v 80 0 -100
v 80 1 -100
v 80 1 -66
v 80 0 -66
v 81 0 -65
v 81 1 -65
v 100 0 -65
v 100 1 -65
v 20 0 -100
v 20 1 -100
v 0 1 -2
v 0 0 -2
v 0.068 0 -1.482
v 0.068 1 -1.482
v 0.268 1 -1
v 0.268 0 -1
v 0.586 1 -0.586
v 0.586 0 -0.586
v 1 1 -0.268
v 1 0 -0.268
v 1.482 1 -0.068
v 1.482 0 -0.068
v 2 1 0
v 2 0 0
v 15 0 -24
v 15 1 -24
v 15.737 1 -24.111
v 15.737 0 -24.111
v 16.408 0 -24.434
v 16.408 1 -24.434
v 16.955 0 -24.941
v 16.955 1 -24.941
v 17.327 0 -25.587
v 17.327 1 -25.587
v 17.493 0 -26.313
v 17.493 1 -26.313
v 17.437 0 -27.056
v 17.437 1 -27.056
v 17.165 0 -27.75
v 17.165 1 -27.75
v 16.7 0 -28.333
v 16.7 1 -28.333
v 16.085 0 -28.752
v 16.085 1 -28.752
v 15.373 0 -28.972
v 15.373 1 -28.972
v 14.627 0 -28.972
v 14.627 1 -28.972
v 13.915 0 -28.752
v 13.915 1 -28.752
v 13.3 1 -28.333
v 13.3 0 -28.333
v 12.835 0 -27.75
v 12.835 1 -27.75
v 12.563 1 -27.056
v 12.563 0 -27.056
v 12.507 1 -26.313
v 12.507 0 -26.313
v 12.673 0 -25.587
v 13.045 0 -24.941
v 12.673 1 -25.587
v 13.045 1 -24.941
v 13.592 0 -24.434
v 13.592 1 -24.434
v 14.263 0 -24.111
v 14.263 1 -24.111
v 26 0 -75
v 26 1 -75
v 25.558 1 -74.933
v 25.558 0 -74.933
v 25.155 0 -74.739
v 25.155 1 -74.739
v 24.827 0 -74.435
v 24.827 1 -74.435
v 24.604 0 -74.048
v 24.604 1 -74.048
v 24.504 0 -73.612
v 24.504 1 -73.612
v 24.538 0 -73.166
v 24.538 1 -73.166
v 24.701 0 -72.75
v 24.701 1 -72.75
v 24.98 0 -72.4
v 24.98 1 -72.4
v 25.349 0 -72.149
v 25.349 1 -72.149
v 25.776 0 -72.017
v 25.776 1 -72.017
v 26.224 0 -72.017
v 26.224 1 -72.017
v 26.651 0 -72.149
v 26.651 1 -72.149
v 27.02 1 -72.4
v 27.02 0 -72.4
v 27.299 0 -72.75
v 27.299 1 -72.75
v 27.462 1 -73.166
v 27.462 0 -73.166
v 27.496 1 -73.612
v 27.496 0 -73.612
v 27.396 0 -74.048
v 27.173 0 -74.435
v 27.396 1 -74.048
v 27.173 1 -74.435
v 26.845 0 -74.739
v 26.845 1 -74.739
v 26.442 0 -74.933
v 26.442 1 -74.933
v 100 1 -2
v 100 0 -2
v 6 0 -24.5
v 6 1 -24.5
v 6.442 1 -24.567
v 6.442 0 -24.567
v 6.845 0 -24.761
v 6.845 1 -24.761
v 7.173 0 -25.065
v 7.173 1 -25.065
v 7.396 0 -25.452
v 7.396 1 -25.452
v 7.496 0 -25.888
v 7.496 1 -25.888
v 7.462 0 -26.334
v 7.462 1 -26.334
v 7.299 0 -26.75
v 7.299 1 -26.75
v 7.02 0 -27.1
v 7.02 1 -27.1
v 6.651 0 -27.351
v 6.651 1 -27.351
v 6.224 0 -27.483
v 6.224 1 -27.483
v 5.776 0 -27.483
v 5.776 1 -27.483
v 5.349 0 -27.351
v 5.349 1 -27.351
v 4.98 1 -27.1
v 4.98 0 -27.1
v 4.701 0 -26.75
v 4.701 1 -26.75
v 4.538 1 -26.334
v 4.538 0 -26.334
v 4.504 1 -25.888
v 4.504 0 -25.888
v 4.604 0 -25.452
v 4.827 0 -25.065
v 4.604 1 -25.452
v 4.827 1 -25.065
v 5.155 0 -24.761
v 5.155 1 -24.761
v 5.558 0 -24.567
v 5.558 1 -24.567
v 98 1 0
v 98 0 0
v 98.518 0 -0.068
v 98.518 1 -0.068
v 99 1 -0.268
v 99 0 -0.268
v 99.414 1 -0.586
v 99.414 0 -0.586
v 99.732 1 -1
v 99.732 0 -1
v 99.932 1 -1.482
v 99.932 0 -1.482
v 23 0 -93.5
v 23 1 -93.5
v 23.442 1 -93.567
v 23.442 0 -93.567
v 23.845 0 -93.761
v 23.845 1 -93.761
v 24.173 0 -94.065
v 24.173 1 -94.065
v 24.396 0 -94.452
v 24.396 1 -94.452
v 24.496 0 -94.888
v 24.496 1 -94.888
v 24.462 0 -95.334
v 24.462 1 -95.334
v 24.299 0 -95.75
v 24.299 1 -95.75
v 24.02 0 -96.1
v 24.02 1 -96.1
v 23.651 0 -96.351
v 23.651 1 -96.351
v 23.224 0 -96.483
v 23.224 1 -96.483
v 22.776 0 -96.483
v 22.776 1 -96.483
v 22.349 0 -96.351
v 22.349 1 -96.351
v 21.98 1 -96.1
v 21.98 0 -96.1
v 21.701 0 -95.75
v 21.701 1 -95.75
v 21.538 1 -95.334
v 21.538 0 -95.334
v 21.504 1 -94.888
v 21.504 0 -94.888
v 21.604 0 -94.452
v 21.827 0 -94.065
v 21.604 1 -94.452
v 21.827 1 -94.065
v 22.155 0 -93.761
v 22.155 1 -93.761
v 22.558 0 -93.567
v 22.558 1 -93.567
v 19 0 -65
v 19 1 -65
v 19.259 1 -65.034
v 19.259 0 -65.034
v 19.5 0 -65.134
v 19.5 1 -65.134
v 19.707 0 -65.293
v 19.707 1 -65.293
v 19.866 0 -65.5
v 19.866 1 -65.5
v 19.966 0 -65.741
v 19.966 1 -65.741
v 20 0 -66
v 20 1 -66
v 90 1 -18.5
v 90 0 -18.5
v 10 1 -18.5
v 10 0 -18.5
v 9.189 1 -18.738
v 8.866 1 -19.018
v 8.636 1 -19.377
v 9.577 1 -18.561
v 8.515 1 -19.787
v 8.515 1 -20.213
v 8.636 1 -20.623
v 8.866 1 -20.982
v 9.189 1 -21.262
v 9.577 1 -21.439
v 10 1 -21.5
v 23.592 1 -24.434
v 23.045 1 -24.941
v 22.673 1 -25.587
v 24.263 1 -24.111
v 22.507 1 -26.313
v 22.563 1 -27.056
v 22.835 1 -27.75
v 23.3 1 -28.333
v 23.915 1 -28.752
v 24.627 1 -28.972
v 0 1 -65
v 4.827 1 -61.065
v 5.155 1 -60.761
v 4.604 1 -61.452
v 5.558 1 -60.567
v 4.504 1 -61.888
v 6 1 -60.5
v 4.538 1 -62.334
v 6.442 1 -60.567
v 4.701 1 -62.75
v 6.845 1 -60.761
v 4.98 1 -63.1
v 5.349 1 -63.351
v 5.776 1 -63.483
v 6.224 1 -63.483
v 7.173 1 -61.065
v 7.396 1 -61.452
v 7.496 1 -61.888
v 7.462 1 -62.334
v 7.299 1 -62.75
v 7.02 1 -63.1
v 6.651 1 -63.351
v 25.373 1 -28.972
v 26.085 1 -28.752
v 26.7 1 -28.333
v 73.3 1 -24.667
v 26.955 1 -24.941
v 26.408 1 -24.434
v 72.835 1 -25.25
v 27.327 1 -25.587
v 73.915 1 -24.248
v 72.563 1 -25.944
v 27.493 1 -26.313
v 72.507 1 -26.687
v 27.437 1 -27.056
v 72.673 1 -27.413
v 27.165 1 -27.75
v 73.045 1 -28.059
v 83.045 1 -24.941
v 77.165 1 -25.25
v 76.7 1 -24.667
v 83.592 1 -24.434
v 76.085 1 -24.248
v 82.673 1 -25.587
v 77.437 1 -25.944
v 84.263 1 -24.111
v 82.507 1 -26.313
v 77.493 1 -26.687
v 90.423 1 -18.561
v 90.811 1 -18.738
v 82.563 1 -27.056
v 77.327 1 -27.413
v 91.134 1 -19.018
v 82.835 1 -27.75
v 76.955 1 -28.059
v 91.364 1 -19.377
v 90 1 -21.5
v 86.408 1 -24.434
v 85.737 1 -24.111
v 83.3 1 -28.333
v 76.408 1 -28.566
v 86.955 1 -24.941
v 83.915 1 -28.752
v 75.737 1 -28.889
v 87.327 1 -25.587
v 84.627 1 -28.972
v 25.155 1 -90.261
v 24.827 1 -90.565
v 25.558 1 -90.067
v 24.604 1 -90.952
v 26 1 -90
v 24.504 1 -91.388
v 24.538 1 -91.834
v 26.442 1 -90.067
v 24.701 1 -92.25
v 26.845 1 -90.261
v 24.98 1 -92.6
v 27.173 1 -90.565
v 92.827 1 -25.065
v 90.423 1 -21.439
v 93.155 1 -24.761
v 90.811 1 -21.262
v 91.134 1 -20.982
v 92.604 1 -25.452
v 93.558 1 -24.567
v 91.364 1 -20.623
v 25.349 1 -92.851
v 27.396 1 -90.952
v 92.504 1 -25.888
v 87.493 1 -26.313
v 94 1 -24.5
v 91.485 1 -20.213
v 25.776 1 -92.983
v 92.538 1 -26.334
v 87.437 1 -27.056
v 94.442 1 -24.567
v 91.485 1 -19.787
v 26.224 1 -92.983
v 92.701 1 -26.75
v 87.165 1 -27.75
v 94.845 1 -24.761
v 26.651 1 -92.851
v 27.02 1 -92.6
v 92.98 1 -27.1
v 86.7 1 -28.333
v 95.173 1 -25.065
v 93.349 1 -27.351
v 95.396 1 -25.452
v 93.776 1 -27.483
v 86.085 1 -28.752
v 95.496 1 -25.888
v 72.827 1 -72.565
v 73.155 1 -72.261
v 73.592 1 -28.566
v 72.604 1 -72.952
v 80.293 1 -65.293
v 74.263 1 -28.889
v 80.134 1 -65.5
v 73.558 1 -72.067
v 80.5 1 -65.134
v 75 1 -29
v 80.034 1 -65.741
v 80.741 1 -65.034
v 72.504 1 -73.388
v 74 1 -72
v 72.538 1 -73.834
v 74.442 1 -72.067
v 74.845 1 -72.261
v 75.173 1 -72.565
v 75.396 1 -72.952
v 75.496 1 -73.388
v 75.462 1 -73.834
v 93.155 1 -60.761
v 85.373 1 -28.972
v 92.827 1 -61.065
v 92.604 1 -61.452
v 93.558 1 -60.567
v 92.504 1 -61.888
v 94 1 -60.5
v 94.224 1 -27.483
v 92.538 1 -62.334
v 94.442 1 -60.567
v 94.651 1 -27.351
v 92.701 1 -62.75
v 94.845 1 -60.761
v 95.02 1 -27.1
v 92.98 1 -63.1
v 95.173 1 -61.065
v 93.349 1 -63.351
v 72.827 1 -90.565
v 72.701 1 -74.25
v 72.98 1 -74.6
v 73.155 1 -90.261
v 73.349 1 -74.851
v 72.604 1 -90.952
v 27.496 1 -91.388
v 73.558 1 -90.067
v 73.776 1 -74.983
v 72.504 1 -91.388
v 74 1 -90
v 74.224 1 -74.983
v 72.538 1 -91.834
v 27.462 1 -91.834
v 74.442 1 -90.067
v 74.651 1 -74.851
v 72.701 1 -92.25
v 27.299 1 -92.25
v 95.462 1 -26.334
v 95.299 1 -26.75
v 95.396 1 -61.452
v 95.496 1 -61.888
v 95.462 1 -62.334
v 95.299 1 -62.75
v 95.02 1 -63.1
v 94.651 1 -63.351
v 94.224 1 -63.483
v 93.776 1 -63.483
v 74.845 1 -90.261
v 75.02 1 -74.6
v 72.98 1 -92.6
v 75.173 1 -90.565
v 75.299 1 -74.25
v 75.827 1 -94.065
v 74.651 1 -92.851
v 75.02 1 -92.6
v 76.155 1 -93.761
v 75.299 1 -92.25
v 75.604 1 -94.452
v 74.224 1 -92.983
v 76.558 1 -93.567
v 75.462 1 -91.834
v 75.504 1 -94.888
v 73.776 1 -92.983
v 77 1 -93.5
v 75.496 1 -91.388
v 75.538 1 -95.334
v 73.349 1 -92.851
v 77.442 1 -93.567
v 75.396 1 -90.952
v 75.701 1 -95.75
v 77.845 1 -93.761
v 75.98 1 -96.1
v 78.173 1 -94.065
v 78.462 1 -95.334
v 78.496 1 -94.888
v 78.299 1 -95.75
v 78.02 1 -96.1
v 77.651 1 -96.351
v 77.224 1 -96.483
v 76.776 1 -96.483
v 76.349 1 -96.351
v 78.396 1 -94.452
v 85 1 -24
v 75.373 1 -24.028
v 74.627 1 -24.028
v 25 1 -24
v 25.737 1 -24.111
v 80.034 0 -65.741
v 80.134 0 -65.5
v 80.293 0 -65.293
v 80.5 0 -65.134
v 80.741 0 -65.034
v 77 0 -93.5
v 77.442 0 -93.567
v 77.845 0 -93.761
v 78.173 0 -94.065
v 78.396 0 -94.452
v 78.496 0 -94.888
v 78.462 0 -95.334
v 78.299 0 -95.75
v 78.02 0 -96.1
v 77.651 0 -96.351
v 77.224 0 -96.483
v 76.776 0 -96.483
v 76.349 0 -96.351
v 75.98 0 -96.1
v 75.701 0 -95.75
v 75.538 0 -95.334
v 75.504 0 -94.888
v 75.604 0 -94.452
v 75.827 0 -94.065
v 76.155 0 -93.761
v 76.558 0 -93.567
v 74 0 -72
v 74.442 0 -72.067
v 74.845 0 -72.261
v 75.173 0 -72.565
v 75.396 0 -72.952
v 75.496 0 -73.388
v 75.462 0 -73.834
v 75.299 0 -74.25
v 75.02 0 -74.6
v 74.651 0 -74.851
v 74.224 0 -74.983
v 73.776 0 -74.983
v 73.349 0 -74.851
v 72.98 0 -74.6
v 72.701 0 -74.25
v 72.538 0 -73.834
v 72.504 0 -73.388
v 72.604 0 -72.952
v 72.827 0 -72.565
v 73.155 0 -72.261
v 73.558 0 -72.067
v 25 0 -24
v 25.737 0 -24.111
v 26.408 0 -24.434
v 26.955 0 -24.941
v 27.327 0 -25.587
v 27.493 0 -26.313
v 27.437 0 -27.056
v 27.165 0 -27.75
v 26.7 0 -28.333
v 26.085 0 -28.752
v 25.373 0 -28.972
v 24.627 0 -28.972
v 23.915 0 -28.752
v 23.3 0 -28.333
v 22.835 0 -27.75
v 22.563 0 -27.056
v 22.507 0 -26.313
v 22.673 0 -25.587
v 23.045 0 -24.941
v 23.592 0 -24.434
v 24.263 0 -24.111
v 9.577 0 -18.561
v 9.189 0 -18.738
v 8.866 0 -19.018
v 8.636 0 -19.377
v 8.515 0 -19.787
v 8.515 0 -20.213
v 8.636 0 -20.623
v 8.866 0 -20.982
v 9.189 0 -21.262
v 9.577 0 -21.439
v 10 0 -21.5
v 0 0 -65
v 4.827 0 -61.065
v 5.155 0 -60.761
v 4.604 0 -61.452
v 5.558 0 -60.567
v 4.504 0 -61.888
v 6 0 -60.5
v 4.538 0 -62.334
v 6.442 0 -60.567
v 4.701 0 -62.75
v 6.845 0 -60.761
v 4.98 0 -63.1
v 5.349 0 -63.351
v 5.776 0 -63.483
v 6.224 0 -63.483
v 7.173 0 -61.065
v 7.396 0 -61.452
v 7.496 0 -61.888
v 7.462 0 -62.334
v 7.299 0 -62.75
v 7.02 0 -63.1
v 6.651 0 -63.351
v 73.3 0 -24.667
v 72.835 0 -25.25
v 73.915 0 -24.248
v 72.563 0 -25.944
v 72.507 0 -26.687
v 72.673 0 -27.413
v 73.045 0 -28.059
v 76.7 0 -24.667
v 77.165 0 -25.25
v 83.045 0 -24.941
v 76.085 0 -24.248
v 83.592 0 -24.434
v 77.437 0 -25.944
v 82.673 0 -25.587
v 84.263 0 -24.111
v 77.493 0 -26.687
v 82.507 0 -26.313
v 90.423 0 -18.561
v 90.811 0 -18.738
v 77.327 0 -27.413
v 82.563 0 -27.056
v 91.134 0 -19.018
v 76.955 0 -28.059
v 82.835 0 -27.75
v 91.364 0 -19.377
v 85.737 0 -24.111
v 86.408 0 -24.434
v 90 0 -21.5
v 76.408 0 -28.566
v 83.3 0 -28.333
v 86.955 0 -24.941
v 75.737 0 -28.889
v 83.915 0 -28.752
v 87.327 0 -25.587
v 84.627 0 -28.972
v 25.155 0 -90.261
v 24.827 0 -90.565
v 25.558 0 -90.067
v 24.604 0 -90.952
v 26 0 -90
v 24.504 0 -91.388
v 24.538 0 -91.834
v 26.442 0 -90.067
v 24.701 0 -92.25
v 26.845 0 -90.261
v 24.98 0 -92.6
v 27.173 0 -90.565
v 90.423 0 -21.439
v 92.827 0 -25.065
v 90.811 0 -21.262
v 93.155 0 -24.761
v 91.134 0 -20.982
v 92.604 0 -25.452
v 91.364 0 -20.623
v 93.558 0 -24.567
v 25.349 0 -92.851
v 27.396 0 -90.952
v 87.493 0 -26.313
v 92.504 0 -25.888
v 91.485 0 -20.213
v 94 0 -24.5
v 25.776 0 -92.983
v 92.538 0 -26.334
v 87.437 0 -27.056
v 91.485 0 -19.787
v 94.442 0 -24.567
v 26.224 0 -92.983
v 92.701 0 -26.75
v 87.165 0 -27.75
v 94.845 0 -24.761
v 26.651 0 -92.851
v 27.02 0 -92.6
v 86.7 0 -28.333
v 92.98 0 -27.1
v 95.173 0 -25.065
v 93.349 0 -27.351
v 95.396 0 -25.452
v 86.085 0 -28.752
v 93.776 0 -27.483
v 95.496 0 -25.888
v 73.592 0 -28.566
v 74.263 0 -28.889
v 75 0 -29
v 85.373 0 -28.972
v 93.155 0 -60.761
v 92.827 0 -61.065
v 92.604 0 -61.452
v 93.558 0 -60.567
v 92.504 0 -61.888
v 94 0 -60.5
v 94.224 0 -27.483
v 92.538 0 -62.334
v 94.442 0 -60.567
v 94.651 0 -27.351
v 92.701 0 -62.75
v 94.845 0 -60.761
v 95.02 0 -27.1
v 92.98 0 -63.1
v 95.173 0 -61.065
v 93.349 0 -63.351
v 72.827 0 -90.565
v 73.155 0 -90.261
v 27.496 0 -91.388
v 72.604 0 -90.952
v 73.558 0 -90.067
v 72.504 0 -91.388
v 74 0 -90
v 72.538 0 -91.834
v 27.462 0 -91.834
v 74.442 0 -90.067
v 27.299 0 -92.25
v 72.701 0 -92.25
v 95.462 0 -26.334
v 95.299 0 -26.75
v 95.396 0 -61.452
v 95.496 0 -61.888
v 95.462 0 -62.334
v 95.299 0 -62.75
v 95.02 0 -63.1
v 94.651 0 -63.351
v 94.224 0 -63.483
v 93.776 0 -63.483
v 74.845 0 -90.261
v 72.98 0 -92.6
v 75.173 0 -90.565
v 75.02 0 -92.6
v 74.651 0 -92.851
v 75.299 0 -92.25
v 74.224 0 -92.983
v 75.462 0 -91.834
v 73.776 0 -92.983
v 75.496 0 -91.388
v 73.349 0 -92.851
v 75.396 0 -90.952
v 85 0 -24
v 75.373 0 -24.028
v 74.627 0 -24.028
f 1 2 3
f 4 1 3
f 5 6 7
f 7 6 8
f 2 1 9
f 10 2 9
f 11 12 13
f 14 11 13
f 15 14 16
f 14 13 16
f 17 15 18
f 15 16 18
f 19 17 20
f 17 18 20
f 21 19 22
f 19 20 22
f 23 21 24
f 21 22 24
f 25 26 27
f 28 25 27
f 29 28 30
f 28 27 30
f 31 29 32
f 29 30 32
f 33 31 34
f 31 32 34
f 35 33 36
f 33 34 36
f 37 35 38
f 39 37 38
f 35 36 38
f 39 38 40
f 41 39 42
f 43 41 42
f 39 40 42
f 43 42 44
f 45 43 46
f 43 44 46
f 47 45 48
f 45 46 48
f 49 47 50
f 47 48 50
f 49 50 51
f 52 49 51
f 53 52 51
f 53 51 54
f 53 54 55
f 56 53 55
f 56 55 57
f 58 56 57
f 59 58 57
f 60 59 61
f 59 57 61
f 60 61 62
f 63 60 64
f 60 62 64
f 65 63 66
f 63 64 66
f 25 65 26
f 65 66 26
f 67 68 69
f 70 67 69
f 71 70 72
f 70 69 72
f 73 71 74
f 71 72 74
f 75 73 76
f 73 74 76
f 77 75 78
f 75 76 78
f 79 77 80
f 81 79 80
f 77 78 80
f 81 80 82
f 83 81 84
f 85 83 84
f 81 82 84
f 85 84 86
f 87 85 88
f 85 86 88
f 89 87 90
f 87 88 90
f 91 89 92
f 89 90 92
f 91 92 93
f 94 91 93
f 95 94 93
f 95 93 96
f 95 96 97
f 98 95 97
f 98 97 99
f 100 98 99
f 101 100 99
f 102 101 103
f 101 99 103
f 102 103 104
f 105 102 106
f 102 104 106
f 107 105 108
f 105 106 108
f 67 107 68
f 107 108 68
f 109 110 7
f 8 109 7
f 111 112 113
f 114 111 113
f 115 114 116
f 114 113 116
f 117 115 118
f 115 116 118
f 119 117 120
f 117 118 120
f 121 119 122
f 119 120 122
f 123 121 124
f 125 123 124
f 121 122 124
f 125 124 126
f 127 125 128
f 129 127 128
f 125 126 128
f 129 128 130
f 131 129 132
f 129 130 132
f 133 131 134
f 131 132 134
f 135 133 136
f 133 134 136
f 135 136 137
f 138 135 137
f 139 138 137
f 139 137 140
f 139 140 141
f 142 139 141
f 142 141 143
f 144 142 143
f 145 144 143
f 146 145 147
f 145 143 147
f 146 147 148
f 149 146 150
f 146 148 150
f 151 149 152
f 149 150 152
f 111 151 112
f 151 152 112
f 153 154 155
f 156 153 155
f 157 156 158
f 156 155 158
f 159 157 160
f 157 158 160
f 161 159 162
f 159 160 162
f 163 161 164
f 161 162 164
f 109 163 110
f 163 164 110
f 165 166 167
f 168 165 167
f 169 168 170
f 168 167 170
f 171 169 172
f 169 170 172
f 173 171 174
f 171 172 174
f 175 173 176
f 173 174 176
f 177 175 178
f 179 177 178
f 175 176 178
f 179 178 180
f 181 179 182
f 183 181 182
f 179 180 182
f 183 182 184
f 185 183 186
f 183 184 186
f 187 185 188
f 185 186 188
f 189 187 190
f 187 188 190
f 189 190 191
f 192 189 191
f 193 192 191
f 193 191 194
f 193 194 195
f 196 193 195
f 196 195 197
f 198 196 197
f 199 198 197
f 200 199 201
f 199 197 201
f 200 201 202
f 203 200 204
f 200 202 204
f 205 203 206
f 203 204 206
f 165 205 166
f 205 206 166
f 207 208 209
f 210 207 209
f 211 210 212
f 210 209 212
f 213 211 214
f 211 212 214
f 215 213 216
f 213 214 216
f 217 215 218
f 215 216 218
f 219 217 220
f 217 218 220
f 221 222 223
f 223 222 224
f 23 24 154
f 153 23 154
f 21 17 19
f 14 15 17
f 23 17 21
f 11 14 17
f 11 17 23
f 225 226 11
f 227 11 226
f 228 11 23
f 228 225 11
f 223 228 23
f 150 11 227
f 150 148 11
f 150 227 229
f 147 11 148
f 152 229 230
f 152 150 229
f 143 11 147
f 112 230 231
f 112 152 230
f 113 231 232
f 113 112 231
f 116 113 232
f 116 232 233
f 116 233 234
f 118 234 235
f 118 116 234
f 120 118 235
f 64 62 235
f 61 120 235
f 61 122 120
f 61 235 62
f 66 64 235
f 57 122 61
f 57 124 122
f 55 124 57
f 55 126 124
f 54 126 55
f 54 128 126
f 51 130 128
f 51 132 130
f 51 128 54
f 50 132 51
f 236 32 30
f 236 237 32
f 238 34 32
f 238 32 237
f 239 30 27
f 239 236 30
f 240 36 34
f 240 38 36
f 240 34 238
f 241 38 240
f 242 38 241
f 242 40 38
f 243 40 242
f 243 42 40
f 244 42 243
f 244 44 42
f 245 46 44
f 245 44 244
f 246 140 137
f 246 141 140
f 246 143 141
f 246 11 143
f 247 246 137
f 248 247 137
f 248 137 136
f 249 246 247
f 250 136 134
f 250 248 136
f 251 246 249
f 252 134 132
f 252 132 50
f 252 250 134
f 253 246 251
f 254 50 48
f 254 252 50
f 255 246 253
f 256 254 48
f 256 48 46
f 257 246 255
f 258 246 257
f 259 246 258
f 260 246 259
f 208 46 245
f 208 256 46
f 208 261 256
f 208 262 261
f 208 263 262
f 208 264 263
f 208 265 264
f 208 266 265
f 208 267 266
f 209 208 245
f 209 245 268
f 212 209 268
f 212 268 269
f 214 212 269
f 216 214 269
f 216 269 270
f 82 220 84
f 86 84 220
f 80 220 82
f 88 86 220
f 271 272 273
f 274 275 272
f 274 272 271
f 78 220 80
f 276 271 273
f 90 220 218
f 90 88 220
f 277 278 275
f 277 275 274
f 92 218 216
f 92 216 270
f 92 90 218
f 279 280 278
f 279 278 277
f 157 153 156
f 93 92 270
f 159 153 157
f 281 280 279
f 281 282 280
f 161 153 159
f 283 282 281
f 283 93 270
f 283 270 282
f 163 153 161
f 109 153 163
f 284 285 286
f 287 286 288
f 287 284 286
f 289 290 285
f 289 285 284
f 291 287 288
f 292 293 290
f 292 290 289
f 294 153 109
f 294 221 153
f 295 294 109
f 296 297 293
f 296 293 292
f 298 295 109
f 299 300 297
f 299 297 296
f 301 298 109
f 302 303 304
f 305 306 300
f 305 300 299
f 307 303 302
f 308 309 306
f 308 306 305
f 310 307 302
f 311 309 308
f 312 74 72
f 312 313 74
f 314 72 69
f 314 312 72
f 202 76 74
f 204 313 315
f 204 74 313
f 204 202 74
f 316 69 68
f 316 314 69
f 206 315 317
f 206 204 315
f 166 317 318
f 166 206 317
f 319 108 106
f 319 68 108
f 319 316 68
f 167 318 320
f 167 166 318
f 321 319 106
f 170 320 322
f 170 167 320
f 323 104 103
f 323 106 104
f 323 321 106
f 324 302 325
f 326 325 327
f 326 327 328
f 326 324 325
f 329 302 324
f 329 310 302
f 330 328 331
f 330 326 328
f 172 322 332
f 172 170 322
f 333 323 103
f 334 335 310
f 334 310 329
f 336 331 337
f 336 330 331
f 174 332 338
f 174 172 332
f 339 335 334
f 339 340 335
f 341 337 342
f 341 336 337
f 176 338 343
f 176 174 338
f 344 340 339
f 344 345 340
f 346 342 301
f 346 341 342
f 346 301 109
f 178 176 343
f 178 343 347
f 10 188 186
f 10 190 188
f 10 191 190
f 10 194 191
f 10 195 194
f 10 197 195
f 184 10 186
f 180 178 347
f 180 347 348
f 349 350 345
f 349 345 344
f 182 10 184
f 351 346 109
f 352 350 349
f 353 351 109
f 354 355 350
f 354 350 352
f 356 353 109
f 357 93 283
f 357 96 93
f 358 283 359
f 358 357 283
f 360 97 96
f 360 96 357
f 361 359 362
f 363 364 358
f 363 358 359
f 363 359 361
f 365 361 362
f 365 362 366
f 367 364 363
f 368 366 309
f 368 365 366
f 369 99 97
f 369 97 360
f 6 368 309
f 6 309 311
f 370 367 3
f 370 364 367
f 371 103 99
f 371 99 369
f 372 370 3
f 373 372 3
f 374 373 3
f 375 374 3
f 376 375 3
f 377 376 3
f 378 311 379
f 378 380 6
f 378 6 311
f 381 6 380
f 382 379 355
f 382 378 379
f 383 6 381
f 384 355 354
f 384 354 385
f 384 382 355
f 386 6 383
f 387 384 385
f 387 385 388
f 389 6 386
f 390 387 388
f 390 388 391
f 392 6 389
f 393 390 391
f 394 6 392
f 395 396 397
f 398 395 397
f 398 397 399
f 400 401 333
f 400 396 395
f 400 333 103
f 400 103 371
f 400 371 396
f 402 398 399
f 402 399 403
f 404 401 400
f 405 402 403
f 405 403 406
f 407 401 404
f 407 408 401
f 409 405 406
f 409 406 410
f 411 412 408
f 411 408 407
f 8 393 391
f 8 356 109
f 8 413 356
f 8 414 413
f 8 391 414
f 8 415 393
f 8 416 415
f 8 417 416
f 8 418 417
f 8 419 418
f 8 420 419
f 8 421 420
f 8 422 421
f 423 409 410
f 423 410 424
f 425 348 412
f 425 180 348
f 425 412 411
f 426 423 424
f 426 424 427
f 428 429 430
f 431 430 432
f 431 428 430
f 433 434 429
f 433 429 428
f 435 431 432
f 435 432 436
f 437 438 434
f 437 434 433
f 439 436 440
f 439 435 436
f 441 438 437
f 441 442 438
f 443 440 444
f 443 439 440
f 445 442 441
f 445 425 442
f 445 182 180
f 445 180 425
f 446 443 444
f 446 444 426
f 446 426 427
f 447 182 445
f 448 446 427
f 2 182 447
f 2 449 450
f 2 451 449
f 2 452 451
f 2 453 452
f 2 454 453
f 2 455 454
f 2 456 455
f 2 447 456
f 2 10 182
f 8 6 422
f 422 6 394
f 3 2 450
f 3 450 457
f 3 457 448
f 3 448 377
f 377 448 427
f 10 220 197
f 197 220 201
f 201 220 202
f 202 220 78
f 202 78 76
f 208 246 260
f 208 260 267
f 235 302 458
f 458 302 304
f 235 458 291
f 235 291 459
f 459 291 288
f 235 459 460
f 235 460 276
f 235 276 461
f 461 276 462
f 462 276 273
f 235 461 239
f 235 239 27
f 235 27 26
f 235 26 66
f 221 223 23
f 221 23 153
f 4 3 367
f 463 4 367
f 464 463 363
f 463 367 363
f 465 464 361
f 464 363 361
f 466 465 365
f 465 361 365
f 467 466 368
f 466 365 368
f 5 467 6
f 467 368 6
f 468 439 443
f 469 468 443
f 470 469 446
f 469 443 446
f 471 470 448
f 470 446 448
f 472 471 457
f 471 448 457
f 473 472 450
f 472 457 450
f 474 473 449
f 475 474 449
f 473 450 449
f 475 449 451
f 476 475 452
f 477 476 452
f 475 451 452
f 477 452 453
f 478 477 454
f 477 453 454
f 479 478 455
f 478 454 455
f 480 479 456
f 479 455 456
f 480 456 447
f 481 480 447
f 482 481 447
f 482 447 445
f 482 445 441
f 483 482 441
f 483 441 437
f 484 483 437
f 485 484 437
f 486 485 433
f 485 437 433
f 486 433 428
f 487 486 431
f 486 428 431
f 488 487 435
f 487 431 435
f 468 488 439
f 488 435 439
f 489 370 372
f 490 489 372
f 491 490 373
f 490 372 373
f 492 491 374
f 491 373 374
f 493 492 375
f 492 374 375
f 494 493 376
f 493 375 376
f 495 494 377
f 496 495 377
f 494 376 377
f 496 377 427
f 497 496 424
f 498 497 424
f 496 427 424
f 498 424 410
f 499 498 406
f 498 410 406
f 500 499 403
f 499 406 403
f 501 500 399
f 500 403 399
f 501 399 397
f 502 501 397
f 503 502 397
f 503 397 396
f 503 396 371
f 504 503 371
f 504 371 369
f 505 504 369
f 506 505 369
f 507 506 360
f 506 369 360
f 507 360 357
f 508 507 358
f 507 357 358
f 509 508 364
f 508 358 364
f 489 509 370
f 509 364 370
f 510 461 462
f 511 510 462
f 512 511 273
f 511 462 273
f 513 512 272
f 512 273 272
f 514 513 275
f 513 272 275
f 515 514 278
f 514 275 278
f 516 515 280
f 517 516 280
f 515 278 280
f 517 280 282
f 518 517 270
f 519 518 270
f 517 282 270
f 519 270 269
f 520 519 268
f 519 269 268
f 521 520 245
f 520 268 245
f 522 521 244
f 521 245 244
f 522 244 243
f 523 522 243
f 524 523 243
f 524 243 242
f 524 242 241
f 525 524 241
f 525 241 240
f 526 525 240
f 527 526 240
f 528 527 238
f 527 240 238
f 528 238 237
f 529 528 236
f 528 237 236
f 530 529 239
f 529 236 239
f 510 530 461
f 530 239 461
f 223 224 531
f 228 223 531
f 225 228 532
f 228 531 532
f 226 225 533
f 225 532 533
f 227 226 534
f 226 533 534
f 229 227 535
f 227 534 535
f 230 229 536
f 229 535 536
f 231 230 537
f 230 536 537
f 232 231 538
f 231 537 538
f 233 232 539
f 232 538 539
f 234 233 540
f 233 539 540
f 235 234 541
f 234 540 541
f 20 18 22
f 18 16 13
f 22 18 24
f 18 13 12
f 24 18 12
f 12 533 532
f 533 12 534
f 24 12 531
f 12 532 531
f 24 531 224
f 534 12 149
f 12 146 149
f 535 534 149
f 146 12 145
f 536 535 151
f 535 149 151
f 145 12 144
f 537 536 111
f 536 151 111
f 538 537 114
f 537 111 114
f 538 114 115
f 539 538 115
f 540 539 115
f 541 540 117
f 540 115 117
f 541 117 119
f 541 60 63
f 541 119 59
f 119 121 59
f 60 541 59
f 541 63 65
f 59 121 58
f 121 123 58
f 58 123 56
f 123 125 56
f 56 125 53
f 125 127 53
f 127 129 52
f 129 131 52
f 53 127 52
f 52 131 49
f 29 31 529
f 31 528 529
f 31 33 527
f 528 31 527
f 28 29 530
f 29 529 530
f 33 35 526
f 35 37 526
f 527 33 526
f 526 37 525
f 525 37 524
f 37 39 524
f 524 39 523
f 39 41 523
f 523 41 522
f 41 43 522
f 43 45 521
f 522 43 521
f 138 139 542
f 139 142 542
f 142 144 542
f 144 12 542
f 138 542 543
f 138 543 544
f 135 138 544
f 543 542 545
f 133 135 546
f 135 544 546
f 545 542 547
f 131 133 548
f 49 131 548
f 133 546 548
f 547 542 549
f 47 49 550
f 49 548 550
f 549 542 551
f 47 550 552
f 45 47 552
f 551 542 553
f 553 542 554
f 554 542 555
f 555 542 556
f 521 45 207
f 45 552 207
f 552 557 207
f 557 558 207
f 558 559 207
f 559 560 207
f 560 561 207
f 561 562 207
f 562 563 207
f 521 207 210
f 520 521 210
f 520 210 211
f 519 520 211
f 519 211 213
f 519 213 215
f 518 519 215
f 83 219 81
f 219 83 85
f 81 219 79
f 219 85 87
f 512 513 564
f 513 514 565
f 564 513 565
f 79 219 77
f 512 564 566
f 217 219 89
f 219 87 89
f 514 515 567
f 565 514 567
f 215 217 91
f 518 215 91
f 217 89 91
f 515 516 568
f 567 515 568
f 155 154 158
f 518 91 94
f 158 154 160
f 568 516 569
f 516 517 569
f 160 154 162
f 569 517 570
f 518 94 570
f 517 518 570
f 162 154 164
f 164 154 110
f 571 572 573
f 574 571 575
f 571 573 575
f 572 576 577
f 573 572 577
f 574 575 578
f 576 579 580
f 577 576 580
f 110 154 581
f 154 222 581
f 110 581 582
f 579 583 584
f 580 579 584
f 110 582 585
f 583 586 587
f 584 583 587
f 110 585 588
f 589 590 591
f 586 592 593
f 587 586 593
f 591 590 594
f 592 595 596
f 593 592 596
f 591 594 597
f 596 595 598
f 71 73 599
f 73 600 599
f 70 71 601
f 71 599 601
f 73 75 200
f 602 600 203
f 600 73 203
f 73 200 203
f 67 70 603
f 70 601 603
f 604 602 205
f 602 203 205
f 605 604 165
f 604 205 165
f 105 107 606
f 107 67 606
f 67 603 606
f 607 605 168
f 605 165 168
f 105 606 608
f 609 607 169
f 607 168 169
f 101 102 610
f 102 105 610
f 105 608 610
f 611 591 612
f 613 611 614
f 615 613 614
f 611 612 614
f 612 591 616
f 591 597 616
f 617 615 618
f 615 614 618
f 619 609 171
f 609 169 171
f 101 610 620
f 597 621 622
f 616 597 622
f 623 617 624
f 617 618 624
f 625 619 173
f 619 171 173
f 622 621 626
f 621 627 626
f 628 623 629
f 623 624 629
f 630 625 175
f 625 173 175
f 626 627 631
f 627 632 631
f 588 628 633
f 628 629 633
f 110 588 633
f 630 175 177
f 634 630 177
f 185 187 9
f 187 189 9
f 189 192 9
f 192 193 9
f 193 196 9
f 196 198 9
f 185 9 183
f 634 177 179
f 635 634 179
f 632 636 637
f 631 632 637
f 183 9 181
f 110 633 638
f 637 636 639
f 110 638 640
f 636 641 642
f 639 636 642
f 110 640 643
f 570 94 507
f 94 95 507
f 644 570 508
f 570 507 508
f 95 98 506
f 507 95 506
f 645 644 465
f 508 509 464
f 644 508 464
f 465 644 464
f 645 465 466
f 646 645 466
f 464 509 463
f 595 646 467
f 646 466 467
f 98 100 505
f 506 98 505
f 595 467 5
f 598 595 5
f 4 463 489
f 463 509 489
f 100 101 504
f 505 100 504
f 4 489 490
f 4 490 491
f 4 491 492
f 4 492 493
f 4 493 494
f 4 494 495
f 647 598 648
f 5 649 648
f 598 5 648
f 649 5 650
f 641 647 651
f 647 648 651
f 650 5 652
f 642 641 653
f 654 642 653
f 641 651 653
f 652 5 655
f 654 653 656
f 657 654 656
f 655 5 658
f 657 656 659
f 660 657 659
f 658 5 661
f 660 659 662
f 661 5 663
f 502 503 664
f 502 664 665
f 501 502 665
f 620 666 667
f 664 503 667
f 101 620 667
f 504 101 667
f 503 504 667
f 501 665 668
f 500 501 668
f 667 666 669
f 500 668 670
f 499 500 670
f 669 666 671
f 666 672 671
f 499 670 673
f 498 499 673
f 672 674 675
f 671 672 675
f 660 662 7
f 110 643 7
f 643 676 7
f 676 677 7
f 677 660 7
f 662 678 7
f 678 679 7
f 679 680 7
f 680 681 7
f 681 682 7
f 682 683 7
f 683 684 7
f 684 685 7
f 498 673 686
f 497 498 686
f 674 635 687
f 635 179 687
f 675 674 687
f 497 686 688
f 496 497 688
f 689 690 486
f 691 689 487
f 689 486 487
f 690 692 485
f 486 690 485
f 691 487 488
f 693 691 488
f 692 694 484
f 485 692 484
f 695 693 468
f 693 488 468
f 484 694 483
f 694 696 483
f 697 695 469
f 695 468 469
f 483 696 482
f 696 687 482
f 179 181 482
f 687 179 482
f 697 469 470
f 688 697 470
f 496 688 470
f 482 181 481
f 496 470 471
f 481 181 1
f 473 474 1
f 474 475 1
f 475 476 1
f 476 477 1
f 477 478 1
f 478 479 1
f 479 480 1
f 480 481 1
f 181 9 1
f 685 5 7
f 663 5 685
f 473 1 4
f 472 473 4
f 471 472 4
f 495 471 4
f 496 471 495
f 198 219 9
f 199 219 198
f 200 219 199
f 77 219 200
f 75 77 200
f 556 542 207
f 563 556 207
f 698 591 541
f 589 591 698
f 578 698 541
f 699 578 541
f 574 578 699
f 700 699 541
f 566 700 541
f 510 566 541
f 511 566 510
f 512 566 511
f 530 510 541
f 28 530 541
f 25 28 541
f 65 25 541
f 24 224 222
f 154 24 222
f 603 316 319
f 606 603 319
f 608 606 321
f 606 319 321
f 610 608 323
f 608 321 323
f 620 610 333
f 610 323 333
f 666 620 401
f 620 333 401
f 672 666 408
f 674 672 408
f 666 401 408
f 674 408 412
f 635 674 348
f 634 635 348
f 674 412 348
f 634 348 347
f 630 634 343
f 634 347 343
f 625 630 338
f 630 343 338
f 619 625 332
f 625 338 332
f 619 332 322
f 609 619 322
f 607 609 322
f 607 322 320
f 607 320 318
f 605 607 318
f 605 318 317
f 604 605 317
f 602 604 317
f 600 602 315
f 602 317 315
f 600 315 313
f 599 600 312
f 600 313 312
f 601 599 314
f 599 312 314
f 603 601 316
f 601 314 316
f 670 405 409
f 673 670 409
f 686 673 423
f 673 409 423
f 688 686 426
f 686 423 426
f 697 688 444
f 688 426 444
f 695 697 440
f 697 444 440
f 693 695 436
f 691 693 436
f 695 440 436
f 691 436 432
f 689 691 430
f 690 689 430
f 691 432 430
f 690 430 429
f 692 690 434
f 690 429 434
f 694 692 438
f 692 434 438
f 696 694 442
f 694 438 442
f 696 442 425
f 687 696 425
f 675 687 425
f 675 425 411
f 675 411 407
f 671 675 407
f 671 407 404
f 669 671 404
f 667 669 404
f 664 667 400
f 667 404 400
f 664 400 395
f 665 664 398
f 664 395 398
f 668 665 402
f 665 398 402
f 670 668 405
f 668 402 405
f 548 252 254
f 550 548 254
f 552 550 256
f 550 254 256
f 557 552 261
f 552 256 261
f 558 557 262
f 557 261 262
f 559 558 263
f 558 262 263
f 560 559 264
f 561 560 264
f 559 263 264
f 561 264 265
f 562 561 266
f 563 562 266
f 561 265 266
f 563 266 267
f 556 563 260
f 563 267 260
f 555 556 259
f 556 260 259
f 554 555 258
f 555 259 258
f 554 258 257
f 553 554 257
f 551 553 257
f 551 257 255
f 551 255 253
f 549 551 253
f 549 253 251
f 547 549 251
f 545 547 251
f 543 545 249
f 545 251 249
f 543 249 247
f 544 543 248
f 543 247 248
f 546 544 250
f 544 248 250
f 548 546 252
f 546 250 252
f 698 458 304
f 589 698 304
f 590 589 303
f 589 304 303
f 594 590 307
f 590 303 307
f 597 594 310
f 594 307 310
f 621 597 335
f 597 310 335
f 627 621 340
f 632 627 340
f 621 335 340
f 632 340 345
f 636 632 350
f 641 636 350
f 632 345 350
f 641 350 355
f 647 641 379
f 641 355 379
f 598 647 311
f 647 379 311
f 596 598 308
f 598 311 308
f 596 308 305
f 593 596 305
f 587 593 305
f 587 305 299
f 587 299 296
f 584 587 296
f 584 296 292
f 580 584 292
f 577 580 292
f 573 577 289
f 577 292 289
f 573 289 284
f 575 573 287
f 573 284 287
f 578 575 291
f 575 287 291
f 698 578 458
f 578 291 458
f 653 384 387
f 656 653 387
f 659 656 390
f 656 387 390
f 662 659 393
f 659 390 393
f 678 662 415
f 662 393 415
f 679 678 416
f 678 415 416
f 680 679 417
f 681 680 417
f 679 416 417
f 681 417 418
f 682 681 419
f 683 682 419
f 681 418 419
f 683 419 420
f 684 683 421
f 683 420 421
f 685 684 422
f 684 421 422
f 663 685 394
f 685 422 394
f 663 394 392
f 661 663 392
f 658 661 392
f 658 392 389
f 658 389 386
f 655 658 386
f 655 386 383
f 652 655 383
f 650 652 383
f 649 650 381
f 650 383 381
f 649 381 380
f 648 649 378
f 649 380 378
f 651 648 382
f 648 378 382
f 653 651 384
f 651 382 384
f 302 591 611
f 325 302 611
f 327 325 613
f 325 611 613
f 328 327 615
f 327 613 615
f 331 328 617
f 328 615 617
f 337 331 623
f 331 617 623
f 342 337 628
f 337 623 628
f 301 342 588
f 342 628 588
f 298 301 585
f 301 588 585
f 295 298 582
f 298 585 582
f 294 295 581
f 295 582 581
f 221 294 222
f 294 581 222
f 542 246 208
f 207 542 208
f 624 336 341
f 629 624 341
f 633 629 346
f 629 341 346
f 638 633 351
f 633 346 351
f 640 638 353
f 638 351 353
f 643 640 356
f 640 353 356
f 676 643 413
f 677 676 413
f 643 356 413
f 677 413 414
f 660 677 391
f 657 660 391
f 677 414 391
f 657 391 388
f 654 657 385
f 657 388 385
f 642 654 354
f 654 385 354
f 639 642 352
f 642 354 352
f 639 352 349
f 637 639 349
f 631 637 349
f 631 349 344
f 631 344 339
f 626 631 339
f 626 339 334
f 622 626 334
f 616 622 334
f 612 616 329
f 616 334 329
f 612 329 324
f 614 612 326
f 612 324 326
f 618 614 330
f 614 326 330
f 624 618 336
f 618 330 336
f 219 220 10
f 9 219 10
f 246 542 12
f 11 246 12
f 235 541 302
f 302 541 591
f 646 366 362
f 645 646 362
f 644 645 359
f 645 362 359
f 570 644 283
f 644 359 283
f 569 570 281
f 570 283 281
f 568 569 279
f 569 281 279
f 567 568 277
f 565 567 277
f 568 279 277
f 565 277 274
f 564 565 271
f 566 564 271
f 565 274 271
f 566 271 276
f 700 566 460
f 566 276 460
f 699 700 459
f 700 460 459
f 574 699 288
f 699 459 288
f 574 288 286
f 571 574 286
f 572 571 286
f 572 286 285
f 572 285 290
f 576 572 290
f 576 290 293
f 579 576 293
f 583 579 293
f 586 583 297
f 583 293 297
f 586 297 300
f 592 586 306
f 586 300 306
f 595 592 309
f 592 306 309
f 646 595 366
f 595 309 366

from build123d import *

# Parameters (mm, degrees)
BOSS_EXTRUDE1_DEPTH = 1
SKETCH2_R           = 1.5
SKETCH2_R_2         = 2.5
CUT_EXTRUDE2_DEPTH  = 1
SKETCH3_R           = 1.5
CUT_EXTRUDE3_DEPTH  = 1


with BuildPart() as part:
    # Sketch1 → Boss-Extrude1 (new body)
    with BuildSketch(Plane(origin=(0, 0, 0), x_dir=(1, 0, 0), z_dir=(0, 1, 0))):
        with BuildLine():
            Line((2, 0), (98, 0))
            ThreePointArc((98, 0), (99.414213562, 0.585786438), (100, 2))
            Line((100, 2), (100, 98))
            ThreePointArc((100, 98), (99.414213562, 99.414213562), (98, 100))
            Line((98, 100), (2, 100))
            ThreePointArc((2, 100), (0.585786438, 99.414213562), (0, 98))
            Line((0, 98), (0, 2))
            ThreePointArc((0, 2), (0.585786438, 0.585786438), (2, 0))
        make_face()
        with BuildLine():
            Line((10, 21.5), (90, 21.5))
            ThreePointArc((90, 21.5), (91.5, 20), (90, 18.5))
            Line((90, 18.5), (10, 18.5))
            ThreePointArc((10, 18.5), (8.5, 20), (10, 21.5))
        make_face(mode=Mode.SUBTRACT)
    extrude(amount=BOSS_EXTRUDE1_DEPTH)

    # Sketch2 → Cut-Extrude2 (cut)
    with BuildSketch(Plane(origin=(0, 1, 0), x_dir=(1, 0, 0), z_dir=(0, 1, 0))):
        with BuildLine():
            Line((0, 100), (0, 65))
            Line((0, 65), (19, 65))
            ThreePointArc((19, 65), (19.707106781, 65.292893219), (20, 66))
            Line((20, 66), (20, 100))
            Line((20, 100), (0, 100))
        make_face()
        with BuildLine():
            Line((100, 65), (100, 100))
            Line((100, 100), (80, 100))
            Line((80, 100), (80, 66))
            ThreePointArc((80, 66), (80.292893219, 65.292893219), (81, 65))
            Line((81, 65), (100, 65))
        make_face()
        with Locations(Location((26, 91.5, 0), (0, 0, 270))):
            Circle(SKETCH2_R)
        with Locations(Location((26, 73.5, 0), (0, 0, 90))):
            Circle(SKETCH2_R)
        with Locations(Location((74, 91.5, 0), (0, 0, 270))):
            Circle(SKETCH2_R)
        with Locations(Location((74, 73.5, 0), (0, 0, 270))):
            Circle(SKETCH2_R)
        with Locations(Location((15, 26.5, 0), (0, 0, 270))):
            Circle(SKETCH2_R_2)
        with Locations(Location((25, 26.5, 0), (0, 0, 270))):
            Circle(SKETCH2_R_2)
        with Locations(Location((85, 26.5, 0), (0, 0, 270))):
            Circle(SKETCH2_R_2)
        with Locations(Location((75, 26.5, 0), (0, 0, 90))):
            Circle(SKETCH2_R_2)
    extrude(amount=-CUT_EXTRUDE2_DEPTH, mode=Mode.SUBTRACT)

    # Sketch3 → Cut-Extrude3 (cut)
    with BuildSketch(Plane(origin=(0, 1, 0), x_dir=(1, 0, 0), z_dir=(0, 1, 0))):
        with Locations(Location((6, 26, 0), (0, 0, 270))):
            Circle(SKETCH3_R)
        with Locations(Location((23, 95, 0), (0, 0, 270))):
            Circle(SKETCH3_R)
        with Locations(Location((77, 95, 0), (0, 0, 270))):
            Circle(SKETCH3_R)
        with Locations(Location((94, 26, 0), (0, 0, 270))):
            Circle(SKETCH3_R)
        with Locations(Location((6, 62, 0), (0, 0, 270))):
            Circle(SKETCH3_R)
        with Locations(Location((94, 62, 0), (0, 0, 270))):
            Circle(SKETCH3_R)
    extrude(amount=-CUT_EXTRUDE3_DEPTH, mode=Mode.SUBTRACT)


solid = part.part
